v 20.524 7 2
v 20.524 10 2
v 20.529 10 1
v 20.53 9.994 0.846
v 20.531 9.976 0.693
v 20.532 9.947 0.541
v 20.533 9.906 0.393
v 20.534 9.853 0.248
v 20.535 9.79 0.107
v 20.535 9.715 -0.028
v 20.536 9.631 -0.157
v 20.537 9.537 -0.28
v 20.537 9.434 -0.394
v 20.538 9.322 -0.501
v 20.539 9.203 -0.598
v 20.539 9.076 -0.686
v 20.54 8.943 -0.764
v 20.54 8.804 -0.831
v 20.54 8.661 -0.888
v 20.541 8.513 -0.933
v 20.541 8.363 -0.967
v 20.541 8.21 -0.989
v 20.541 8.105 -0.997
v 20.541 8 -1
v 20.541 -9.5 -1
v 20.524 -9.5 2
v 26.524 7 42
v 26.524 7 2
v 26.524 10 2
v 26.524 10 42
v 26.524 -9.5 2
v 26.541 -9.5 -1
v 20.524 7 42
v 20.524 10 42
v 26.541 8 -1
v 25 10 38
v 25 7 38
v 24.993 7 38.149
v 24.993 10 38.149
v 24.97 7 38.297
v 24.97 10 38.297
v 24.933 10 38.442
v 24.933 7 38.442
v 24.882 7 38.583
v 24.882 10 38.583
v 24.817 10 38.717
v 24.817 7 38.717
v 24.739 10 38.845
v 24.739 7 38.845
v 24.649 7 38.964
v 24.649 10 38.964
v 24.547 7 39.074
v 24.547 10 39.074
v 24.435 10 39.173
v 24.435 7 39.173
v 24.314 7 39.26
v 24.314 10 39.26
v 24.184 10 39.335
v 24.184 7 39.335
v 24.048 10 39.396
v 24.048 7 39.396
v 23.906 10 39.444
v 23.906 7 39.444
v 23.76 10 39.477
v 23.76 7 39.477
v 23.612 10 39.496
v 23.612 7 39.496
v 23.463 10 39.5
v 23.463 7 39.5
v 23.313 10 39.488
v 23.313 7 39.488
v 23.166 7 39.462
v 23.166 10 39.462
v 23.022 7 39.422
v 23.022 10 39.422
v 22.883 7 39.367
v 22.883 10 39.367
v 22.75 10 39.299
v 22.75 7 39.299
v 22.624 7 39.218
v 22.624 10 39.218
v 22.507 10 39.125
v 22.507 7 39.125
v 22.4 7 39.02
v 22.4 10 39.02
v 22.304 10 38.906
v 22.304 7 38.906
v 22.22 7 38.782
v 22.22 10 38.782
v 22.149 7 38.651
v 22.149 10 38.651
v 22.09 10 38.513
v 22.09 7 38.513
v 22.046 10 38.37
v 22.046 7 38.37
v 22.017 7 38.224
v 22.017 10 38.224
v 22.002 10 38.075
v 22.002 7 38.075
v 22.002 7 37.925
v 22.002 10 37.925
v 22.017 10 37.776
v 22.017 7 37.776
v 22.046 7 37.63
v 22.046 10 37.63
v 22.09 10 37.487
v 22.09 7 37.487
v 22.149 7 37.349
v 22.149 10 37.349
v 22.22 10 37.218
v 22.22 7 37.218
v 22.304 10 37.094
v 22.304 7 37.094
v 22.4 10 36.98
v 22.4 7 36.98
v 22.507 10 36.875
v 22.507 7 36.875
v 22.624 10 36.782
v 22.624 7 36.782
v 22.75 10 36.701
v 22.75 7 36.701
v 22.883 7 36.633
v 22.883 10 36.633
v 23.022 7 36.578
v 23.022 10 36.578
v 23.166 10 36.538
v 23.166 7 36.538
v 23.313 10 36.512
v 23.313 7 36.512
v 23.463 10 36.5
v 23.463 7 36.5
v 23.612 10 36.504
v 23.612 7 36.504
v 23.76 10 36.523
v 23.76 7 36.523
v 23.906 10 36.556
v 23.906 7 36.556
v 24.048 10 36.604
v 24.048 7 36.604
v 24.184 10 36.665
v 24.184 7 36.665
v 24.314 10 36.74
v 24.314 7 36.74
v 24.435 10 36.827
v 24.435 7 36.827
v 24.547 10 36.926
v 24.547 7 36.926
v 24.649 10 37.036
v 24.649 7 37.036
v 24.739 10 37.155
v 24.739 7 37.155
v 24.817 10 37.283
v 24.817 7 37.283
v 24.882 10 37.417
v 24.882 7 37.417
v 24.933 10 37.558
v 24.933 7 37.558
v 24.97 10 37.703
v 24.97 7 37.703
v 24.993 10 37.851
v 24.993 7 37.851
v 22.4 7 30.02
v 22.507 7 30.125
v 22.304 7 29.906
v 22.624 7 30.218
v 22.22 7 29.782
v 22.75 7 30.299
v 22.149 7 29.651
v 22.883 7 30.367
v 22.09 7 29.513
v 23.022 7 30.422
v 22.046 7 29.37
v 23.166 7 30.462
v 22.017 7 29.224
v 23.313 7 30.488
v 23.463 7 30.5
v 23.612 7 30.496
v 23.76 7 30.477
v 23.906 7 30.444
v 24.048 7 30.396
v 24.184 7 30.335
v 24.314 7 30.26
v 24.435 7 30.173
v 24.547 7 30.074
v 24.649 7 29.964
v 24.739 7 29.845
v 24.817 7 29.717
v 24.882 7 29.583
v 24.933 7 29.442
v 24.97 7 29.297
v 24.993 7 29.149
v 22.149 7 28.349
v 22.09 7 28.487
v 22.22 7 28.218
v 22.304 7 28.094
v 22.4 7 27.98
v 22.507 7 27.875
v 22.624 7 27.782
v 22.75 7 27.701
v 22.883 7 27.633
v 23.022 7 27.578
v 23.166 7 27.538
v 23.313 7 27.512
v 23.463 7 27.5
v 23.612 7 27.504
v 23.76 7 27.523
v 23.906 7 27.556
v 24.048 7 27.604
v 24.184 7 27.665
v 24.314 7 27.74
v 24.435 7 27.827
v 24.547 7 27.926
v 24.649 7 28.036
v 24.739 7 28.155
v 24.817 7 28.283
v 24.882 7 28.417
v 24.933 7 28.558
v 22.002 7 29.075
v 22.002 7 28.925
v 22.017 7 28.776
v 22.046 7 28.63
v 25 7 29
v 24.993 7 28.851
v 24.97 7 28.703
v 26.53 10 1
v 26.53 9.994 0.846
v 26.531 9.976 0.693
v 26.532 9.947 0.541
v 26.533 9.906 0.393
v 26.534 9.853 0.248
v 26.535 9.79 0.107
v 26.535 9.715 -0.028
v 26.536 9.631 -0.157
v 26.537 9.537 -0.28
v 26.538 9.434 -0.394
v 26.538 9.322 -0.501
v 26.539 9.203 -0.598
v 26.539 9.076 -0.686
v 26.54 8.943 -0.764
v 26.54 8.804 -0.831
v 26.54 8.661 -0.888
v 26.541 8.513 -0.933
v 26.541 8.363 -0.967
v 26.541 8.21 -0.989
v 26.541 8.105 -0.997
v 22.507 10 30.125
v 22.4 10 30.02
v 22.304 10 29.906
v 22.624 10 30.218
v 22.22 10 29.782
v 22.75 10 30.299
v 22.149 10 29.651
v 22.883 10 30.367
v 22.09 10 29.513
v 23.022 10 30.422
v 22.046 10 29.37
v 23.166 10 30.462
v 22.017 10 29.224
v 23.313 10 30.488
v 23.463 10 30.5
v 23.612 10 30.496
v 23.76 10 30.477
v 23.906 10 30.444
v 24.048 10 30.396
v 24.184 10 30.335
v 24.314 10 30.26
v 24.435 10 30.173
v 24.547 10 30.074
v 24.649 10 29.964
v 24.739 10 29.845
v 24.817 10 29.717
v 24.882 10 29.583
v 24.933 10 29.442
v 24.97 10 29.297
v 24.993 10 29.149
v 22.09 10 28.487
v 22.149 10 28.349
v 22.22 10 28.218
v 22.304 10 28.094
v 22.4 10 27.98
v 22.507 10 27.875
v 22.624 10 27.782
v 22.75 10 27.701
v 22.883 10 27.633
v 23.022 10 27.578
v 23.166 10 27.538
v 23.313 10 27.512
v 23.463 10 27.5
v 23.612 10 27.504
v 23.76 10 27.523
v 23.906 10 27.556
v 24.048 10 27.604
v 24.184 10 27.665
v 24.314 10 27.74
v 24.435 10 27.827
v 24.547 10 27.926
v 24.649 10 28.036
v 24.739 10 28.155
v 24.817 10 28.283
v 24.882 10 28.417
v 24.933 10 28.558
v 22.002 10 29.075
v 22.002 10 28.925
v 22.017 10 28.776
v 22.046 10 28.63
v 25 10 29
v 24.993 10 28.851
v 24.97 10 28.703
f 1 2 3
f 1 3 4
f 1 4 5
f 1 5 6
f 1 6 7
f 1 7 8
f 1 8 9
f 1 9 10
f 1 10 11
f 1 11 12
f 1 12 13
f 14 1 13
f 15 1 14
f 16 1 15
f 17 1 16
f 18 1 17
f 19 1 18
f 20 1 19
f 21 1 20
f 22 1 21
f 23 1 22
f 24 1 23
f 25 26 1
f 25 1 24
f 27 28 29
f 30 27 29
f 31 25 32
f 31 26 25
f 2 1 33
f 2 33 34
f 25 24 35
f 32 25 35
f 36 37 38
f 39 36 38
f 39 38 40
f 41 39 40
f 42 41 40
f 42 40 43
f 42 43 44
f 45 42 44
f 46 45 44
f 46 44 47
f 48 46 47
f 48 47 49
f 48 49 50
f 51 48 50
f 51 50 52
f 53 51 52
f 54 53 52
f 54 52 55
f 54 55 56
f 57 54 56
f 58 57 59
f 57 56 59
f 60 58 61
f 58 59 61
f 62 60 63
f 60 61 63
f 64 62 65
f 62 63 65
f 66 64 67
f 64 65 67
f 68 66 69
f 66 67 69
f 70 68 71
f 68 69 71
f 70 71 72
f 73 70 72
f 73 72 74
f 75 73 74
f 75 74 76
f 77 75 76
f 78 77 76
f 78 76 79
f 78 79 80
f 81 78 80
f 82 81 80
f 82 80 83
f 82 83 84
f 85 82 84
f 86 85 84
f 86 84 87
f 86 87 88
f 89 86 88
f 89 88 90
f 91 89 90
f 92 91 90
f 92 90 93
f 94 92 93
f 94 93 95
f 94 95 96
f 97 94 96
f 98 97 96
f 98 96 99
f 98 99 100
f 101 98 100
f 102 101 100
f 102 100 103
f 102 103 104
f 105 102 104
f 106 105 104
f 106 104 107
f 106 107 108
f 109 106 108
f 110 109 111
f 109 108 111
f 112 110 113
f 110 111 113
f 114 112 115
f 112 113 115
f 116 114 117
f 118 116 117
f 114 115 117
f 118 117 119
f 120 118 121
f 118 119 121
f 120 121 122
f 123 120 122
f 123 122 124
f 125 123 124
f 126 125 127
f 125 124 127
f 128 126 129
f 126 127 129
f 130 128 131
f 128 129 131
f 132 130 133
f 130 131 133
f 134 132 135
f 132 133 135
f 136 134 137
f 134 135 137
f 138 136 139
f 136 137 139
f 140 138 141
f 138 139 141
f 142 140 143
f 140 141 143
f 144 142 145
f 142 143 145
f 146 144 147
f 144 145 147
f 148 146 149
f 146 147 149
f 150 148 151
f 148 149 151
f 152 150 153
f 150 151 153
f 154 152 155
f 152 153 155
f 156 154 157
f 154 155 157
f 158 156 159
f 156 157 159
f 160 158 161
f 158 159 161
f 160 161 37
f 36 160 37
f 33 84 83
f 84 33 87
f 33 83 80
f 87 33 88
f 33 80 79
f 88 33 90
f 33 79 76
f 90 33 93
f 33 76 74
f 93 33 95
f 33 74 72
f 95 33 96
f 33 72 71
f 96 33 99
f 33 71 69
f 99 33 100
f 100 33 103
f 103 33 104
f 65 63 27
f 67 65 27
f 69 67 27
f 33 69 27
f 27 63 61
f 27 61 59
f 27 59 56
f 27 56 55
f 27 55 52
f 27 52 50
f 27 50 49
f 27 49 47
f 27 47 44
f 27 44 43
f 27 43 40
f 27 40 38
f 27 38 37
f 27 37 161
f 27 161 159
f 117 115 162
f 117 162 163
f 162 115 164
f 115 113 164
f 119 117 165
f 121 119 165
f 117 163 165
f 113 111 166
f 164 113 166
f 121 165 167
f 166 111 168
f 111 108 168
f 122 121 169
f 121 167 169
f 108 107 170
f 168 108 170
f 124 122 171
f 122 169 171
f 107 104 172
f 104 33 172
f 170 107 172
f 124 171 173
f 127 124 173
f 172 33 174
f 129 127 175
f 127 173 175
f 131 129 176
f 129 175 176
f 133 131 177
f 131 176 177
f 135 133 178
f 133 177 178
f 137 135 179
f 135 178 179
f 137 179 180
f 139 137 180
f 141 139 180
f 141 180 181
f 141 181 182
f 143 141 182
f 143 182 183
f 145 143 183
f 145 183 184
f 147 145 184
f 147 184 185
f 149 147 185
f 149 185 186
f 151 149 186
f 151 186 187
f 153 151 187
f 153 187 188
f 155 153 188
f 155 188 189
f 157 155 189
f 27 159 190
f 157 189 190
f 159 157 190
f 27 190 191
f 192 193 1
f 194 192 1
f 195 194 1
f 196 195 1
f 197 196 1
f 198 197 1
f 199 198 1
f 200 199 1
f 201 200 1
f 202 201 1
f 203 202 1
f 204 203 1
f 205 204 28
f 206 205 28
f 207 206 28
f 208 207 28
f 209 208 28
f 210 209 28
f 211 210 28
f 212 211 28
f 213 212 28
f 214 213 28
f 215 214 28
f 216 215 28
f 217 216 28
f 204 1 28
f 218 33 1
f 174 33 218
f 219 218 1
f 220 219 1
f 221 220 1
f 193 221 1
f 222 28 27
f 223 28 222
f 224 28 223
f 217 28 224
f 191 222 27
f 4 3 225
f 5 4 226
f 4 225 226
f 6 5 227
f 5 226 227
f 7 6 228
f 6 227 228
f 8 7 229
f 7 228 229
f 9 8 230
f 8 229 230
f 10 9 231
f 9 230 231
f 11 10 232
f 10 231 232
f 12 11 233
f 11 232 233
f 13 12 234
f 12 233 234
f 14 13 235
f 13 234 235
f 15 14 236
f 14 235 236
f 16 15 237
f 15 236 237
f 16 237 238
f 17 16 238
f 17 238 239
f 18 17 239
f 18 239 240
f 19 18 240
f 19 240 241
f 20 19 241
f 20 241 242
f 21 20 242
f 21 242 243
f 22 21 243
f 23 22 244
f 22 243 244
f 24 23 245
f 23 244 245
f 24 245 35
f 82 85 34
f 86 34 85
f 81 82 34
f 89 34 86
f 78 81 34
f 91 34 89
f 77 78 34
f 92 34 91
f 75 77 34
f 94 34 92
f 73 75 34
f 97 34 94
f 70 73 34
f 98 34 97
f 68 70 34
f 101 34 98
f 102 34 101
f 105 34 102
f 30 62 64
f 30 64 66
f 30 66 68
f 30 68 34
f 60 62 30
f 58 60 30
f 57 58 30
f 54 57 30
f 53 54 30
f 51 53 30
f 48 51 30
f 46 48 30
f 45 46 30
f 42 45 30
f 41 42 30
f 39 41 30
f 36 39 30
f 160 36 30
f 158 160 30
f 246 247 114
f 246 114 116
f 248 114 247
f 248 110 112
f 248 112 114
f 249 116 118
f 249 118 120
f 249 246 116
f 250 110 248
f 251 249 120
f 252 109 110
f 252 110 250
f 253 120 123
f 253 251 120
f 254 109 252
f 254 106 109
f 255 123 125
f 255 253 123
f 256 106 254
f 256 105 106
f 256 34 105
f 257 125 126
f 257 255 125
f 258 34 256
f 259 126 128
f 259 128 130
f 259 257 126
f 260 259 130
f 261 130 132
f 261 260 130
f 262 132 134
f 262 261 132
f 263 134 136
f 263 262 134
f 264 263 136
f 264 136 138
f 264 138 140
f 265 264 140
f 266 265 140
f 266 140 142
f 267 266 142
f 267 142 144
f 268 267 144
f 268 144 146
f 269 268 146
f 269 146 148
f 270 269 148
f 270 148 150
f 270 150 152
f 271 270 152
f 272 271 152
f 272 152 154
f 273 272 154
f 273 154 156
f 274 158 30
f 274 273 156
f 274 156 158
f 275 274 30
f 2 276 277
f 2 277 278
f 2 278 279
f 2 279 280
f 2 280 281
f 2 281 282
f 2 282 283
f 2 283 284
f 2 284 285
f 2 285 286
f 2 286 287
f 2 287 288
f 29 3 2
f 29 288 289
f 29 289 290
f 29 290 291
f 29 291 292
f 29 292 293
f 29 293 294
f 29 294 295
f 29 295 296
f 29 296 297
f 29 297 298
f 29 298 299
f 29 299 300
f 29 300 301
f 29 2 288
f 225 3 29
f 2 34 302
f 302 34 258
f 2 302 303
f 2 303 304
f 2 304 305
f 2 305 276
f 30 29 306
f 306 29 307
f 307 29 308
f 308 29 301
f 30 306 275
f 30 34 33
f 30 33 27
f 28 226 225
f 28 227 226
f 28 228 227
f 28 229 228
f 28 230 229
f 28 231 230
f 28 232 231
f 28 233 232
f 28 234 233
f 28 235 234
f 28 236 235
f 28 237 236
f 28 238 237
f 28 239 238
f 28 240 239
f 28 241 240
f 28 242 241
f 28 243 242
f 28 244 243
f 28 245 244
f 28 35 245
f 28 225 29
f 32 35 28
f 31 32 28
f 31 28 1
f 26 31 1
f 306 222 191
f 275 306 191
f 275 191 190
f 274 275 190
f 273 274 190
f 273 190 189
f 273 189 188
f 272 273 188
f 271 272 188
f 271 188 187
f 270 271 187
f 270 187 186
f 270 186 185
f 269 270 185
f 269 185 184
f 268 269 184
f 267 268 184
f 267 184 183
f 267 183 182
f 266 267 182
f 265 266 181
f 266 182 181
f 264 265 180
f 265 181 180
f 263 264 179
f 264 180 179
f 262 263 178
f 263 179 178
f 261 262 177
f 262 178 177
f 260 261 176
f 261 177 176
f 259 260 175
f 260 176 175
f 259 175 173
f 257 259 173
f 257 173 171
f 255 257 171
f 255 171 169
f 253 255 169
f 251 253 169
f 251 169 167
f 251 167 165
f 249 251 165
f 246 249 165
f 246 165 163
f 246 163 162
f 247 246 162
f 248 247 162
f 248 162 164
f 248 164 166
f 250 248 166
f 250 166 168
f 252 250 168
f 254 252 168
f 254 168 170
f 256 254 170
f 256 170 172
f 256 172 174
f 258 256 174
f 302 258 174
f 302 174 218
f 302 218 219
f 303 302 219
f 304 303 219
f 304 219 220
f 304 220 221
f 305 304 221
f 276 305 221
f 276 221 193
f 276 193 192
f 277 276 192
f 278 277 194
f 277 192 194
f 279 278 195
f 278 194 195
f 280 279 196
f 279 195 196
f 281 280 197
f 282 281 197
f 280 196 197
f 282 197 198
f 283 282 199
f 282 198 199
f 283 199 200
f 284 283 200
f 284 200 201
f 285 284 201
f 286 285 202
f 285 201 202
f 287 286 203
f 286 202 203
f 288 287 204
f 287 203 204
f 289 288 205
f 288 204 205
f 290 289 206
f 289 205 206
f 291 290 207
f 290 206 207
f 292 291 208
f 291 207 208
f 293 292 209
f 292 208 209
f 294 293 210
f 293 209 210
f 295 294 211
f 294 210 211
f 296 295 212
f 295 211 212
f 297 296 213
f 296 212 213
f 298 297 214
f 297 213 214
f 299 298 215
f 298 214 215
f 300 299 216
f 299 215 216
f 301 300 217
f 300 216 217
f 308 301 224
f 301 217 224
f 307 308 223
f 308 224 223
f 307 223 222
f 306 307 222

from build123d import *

# Parameters (mm, degrees)
BOSS_EXTRUDE1_DEPTH = 19.5
SKETCH5_W           = 6.000098135
SKETCH5_H           = 3
BOSS_EXTRUDE2_DEPTH = 40
FILLET1_R           = 2
SKETCH6_R           = 1.5
CUT_EXTRUDE1_DEPTH  = 4


with BuildPart() as part:
    # Sketch3 → Boss-Extrude1 (new body)
    with BuildSketch(Plane.XZ.offset(9.5)):
        Polygon((20.540895742, -1), (26.540993877, -1), (26.523835555, 2), (20.52373742, 2), align=None)
    extrude(amount=-BOSS_EXTRUDE1_DEPTH)

    # Sketch5 → Boss-Extrude2 (add)
    with BuildSketch(Plane.XY.offset(2)):
        with Locations((23.523786488, 8.5)):
            Rectangle(SKETCH5_W, SKETCH5_H)
    extrude(amount=BOSS_EXTRUDE2_DEPTH)

    # Fillet1
    fillet1_edges = [part.edges().sort_by_distance(p)[0] for p in [
        (23.540944809, 10, -1),
    ]]
    fillet(fillet1_edges, radius=FILLET1_R)

    # Sketch6 → Cut-Extrude1 (cut, through all)
    with BuildSketch(Plane.XZ.offset(-7)):
        with Locations((23.5, 38)):
            Circle(SKETCH6_R)
        with Locations((23.5, 29)):
            Circle(SKETCH6_R)
    extrude(amount=-CUT_EXTRUDE1_DEPTH, mode=Mode.SUBTRACT)


solid = part.part
